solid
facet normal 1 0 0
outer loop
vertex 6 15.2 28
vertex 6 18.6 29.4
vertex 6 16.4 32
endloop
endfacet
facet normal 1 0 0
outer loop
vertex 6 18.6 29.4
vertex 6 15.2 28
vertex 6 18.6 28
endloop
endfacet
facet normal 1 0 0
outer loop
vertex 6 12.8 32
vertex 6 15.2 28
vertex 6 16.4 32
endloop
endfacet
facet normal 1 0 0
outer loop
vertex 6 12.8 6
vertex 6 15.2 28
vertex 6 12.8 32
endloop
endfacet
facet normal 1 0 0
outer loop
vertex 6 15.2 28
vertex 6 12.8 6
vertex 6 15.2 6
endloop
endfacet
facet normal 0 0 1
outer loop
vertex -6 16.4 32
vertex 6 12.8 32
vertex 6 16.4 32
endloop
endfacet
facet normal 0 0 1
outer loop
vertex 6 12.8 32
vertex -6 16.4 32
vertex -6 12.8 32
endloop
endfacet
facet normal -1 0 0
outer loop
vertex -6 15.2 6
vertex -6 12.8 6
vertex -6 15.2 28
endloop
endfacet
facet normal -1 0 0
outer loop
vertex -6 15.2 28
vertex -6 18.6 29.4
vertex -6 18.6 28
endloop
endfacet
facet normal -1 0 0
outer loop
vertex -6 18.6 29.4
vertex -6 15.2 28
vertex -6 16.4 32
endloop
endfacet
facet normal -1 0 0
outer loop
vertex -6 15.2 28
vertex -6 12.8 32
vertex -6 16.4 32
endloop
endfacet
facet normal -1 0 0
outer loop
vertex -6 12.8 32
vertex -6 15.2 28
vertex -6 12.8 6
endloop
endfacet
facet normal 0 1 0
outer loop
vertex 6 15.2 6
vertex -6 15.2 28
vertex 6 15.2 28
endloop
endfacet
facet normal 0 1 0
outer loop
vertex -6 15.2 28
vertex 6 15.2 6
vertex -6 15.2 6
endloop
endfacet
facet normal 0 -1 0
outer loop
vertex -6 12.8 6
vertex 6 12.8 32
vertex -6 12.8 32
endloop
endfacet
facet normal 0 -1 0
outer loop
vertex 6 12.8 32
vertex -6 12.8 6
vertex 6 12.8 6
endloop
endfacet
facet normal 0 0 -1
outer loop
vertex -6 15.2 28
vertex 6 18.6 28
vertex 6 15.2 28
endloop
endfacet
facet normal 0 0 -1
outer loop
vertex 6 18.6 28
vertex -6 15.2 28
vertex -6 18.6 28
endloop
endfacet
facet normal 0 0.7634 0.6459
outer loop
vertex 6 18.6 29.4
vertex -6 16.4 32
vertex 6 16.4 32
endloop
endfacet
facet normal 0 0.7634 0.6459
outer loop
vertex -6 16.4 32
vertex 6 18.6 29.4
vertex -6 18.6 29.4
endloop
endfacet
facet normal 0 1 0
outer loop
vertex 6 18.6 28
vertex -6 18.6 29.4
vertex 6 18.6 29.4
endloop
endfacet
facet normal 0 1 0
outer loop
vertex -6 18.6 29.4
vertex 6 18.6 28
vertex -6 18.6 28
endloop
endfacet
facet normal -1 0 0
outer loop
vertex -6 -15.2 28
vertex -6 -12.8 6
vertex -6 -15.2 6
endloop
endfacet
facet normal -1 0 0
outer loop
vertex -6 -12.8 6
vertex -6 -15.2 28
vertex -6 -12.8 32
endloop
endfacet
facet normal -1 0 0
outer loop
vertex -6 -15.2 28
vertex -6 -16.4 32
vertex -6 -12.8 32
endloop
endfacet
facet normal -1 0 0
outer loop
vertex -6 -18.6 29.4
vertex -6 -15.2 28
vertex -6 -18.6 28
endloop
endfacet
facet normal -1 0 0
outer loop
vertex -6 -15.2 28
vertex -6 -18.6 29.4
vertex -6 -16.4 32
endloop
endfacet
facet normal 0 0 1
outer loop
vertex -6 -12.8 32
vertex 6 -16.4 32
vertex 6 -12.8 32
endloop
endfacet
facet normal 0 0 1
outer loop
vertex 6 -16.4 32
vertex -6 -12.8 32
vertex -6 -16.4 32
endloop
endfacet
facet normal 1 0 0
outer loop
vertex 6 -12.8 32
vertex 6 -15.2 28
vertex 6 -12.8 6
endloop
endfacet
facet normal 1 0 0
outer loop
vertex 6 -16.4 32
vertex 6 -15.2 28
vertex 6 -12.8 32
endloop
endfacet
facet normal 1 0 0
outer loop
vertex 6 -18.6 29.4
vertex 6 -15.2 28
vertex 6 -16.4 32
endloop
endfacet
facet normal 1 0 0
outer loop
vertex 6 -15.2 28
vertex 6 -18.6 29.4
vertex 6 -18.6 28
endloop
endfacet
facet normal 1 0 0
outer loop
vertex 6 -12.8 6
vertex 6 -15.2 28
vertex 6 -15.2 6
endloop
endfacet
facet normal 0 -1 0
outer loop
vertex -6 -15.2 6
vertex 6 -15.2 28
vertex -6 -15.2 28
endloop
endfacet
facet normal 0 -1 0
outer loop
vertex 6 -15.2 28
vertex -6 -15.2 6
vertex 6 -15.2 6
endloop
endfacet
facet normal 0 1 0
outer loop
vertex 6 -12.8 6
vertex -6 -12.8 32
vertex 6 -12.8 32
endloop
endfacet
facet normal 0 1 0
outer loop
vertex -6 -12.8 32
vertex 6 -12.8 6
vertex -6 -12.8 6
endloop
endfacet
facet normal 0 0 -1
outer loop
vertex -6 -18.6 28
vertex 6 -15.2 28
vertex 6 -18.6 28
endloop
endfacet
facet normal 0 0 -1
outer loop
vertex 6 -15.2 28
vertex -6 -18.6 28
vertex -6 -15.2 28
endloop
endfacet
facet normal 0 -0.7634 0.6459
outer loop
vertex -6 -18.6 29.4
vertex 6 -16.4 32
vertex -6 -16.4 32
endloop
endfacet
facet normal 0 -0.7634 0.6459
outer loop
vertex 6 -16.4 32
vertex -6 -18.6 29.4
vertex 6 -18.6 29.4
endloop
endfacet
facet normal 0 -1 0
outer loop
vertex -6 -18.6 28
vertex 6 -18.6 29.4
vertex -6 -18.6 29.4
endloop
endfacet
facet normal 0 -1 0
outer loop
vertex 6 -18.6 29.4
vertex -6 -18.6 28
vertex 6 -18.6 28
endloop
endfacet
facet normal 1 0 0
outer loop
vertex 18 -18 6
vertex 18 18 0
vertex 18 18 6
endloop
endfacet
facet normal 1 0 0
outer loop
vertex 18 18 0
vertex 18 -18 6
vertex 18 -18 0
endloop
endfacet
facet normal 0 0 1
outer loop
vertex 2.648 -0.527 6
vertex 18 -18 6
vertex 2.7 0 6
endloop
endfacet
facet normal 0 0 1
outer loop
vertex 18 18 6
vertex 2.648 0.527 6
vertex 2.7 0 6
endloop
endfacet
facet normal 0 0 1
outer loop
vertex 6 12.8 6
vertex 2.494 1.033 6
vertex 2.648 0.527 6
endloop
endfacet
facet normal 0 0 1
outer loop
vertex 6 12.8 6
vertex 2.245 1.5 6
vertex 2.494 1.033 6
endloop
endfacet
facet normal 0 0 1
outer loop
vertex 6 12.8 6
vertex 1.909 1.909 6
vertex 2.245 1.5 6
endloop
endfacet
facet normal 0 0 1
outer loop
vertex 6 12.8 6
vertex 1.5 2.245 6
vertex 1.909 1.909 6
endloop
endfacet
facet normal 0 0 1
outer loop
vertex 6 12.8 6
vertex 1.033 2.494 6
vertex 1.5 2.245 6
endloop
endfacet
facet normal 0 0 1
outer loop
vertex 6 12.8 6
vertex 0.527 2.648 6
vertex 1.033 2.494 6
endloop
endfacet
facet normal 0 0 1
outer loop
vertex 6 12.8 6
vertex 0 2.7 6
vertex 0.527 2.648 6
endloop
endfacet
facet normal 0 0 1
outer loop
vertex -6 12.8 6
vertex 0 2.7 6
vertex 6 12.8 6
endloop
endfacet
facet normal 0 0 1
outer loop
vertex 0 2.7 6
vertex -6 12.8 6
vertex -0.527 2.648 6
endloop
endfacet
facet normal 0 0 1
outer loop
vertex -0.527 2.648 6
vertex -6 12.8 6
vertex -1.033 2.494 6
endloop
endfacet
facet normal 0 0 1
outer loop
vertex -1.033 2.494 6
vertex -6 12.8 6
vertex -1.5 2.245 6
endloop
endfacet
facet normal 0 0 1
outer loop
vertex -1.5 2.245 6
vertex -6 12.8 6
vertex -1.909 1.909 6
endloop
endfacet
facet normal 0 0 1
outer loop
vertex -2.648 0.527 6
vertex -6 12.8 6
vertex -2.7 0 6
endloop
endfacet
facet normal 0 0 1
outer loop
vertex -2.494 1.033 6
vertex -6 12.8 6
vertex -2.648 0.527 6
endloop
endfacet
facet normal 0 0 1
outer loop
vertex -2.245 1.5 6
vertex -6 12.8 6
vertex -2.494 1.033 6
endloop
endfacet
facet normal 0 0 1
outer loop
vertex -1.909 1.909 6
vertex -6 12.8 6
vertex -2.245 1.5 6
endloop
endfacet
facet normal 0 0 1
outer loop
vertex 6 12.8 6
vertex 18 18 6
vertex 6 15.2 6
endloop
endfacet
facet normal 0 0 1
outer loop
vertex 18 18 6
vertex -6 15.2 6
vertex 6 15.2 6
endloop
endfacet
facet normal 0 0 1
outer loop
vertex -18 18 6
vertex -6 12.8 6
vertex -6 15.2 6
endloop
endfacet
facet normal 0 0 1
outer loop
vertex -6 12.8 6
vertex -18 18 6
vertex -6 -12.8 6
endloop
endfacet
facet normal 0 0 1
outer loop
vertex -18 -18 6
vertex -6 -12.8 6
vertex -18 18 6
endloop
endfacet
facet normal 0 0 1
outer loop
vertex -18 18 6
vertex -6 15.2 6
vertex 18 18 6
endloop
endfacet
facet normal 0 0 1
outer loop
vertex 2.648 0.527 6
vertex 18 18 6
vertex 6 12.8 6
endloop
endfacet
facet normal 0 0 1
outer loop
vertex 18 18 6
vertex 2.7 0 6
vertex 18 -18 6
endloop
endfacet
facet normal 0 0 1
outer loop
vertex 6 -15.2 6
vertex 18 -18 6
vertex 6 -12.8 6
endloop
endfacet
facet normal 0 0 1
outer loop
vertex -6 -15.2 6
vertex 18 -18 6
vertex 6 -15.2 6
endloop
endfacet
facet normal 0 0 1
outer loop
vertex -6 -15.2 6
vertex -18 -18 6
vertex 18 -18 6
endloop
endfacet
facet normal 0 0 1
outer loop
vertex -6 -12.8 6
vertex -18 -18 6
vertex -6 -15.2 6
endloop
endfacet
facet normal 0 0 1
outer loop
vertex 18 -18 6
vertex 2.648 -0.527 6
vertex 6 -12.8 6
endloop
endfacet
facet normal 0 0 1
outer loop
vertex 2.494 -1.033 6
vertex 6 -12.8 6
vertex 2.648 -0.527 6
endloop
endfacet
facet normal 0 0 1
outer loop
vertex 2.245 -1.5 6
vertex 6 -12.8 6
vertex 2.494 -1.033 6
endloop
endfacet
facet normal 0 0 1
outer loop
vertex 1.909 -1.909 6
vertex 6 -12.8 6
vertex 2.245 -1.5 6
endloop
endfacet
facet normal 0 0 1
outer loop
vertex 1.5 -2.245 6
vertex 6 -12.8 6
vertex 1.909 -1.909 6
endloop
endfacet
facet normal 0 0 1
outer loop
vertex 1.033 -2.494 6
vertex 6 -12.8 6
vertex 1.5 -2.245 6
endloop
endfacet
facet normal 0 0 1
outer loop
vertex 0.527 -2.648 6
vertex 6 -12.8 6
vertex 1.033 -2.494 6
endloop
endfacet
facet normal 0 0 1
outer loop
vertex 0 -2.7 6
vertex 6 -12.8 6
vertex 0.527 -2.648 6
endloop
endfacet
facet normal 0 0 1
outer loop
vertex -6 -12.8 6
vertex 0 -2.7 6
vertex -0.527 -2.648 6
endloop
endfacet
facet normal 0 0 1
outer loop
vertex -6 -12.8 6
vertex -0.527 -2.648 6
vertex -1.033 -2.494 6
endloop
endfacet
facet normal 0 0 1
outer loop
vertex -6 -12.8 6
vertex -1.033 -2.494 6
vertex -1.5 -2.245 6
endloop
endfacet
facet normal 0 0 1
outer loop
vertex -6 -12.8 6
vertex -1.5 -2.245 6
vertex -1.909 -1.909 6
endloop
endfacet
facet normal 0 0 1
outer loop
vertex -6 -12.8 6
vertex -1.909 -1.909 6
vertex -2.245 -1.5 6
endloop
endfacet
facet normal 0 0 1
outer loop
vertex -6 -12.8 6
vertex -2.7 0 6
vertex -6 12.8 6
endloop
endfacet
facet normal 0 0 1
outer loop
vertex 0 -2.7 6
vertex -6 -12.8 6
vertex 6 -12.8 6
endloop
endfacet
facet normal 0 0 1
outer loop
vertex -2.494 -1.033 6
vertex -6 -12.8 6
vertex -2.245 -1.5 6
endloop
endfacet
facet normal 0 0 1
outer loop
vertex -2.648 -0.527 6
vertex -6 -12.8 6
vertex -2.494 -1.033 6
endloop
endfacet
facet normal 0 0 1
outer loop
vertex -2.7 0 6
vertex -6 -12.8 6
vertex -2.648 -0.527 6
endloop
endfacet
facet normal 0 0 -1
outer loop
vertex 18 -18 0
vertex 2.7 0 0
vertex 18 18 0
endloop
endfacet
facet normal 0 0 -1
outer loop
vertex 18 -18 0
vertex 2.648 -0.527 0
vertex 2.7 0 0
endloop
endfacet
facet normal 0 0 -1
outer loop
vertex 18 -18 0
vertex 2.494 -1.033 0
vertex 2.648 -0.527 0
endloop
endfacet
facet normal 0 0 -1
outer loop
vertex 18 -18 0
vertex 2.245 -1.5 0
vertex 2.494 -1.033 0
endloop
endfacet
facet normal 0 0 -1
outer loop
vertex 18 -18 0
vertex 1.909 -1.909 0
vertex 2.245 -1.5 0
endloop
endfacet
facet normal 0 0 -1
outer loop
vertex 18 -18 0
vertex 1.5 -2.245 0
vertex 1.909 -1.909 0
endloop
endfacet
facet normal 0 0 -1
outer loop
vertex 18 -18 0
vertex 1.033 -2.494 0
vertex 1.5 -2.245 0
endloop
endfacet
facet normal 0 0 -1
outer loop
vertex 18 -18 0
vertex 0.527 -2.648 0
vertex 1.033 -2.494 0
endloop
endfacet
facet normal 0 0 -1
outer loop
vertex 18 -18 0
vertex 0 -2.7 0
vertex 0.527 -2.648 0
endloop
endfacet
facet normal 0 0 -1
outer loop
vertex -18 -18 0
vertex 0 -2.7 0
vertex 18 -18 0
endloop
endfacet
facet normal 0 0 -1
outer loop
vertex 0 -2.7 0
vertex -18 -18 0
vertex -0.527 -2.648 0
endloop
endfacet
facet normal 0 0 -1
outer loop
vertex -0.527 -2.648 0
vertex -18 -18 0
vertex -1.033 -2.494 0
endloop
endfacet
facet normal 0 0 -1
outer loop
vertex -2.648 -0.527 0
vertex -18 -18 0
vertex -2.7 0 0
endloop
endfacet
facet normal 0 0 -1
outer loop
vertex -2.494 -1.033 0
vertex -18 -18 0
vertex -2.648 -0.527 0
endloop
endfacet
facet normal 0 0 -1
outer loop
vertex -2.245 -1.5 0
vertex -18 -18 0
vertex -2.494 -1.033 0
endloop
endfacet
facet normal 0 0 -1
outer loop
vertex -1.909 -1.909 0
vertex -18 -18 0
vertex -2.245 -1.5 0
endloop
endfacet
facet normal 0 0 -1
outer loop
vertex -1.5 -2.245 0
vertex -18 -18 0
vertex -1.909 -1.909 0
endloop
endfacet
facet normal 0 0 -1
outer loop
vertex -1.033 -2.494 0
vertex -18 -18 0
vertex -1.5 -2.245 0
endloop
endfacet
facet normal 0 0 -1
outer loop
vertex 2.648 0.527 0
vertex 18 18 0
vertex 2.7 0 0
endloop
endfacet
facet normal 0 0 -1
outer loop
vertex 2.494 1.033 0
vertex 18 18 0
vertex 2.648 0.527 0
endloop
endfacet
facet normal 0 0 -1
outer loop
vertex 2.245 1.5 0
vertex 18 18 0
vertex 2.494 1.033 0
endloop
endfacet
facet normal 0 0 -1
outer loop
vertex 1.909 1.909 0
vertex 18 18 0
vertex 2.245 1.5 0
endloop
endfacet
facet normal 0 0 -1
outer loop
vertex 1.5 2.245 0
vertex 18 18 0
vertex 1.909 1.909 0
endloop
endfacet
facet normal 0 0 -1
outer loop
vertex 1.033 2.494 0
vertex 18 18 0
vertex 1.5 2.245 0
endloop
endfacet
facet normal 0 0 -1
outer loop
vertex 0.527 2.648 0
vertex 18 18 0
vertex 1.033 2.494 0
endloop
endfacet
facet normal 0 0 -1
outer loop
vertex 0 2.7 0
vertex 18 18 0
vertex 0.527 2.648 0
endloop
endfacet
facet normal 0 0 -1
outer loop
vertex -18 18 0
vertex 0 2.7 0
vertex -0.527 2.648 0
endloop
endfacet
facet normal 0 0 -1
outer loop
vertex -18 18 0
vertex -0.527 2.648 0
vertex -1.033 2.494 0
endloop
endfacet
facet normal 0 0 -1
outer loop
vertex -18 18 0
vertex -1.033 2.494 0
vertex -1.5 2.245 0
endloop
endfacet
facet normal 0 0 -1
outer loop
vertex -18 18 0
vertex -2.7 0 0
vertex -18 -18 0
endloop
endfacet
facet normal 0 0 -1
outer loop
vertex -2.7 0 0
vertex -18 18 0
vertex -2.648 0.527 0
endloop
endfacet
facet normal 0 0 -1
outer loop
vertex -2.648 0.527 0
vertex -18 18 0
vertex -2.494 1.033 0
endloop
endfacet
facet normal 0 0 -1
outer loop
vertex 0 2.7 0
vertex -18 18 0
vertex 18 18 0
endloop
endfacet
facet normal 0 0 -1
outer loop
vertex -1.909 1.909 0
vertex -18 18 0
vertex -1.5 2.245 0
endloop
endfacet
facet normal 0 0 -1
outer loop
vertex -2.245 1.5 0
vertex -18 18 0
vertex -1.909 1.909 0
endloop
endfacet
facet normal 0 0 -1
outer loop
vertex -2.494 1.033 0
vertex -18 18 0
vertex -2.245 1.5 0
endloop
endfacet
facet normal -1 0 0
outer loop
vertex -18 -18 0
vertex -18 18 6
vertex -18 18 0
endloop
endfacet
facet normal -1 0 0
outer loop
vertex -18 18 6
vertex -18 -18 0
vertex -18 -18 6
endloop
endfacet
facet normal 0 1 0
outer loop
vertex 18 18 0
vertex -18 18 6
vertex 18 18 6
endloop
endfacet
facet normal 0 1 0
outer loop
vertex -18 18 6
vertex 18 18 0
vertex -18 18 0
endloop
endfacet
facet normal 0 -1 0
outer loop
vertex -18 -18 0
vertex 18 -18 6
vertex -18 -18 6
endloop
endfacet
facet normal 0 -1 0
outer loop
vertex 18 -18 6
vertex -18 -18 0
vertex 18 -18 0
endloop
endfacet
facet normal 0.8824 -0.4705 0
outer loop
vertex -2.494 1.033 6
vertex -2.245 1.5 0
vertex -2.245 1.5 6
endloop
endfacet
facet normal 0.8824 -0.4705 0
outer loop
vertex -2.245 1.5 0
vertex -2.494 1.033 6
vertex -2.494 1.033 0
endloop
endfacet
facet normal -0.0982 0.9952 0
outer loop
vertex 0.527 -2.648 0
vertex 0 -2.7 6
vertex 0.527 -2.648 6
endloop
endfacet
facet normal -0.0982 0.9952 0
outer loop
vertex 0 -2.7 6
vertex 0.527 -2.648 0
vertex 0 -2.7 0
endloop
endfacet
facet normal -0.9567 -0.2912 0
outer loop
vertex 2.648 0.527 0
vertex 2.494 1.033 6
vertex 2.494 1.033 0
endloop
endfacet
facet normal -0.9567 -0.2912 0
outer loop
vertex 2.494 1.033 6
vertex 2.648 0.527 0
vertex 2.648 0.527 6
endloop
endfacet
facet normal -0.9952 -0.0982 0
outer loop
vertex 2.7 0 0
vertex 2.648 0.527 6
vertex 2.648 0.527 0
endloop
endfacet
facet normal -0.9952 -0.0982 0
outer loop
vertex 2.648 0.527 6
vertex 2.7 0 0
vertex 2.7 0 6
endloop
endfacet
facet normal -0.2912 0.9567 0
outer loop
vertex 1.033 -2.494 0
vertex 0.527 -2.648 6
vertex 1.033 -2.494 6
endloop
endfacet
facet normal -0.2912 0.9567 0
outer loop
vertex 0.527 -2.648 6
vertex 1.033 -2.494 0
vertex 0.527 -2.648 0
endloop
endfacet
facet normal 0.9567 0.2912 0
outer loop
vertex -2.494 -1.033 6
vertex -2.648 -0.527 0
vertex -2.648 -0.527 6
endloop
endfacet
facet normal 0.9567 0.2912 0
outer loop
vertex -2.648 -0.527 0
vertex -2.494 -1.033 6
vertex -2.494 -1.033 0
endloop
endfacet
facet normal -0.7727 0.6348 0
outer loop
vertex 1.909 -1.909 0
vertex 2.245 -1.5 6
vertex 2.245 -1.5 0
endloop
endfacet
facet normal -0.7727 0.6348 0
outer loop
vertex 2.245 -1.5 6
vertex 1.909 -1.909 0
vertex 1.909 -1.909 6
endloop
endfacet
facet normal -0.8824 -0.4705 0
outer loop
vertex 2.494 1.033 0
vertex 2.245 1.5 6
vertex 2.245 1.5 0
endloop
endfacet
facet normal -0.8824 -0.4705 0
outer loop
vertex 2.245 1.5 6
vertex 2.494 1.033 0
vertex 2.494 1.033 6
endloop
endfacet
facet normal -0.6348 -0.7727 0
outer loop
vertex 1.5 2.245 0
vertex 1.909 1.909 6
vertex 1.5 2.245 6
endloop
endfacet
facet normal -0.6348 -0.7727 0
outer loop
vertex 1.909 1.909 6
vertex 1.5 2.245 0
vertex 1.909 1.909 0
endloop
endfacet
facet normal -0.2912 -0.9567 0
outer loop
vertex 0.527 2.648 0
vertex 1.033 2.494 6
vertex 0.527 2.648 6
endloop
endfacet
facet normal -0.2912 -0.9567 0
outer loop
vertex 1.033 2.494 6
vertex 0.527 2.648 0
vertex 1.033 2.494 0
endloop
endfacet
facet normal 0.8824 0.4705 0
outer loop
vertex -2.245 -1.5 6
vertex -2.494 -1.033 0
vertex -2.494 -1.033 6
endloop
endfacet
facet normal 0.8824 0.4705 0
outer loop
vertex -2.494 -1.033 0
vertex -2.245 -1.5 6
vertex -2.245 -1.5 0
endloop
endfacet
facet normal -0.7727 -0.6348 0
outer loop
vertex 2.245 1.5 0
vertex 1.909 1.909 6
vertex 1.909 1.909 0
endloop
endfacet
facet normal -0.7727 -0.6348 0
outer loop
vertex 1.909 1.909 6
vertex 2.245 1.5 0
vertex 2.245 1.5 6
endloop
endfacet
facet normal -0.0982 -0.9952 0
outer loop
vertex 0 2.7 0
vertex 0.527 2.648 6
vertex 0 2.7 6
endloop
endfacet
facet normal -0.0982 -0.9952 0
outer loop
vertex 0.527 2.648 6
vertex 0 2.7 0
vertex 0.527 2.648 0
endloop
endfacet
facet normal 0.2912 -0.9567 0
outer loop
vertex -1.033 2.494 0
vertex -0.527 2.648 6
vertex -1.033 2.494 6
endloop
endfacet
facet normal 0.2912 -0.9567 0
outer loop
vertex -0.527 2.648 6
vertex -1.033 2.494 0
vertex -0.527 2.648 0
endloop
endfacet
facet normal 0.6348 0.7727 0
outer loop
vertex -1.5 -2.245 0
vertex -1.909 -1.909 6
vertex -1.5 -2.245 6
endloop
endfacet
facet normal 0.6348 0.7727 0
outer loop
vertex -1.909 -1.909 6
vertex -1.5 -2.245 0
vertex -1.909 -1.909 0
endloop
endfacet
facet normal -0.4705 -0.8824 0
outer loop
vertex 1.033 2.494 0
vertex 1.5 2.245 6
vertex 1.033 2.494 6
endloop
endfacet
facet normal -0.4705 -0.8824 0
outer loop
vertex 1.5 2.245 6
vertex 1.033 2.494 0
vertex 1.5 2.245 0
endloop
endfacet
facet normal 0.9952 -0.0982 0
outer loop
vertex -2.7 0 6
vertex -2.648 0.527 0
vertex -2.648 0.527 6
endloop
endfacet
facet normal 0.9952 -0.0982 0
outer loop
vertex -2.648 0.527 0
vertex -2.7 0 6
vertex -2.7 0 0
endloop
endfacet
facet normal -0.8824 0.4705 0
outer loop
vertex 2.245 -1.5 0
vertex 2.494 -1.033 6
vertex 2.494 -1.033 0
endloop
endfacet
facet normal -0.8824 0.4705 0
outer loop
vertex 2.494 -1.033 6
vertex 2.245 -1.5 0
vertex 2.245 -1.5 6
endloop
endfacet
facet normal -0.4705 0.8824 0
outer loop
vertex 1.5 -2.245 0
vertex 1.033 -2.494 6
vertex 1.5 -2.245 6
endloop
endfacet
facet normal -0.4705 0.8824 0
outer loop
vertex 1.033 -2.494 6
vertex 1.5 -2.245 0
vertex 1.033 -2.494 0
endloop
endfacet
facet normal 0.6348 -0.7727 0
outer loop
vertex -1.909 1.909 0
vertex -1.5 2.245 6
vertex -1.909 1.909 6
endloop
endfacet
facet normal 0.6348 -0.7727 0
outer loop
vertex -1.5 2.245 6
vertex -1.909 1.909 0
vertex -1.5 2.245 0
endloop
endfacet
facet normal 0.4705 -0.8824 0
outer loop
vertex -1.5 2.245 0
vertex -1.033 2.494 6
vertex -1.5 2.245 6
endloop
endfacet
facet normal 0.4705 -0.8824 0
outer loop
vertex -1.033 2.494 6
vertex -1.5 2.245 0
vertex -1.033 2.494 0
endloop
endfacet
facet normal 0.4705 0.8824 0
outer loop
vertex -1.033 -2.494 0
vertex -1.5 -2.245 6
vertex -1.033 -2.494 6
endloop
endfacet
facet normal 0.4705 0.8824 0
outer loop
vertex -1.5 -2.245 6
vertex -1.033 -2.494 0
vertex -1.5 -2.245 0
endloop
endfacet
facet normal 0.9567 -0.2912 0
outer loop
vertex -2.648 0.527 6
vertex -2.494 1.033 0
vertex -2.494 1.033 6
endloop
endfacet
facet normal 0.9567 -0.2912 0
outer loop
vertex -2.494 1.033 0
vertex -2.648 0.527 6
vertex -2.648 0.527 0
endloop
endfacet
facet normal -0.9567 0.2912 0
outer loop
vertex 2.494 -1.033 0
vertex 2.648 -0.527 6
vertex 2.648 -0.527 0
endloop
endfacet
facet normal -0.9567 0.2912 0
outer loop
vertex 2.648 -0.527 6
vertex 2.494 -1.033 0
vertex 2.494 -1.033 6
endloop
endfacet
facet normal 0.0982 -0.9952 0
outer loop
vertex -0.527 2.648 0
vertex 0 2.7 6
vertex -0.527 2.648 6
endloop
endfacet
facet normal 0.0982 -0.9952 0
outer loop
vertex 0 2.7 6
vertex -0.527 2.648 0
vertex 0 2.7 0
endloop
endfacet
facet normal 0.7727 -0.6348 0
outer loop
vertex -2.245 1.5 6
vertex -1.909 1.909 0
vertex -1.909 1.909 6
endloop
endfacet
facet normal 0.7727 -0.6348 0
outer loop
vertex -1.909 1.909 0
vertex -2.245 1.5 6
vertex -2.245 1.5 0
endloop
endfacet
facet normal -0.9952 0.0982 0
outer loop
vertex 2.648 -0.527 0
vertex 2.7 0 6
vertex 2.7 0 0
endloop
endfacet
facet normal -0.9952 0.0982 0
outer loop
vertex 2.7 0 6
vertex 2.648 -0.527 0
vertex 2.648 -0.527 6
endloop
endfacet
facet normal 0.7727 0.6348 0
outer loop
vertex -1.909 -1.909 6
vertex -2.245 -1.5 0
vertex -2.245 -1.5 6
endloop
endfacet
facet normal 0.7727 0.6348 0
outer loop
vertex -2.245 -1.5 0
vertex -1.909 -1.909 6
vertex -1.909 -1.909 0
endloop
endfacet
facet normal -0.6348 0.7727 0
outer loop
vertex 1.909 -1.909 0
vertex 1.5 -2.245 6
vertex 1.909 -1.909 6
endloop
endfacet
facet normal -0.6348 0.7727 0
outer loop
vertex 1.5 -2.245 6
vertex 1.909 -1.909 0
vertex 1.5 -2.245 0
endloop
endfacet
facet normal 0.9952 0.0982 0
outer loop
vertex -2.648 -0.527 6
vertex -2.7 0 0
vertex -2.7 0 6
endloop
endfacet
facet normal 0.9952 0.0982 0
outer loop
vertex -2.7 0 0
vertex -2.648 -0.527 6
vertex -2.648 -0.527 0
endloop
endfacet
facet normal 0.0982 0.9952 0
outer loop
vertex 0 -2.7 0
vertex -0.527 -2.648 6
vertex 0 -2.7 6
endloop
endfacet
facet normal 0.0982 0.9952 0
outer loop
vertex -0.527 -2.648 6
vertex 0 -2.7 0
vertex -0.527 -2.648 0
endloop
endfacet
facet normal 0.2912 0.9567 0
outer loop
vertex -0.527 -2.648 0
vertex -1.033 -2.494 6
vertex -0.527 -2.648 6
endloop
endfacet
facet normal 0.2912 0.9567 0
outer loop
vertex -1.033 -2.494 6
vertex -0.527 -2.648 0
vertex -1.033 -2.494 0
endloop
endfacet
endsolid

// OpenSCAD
$fn = 32;

// ----------------------------------------------------------------------
// Snap-fit latch: 2 arms, 26 mm tall, 3.6 mm undercut hooks
// ----------------------------------------------------------------------

// --- parameters (mm) ---
base_d = 36;              // base plate depth
base_h = 6;               // base plate thickness
span = 28;                // distance between opposite arms
arm_t = 2.4;              // arm thickness
arm_d = 12;               // arm width
height = 26;              // free arm length
head_len = 3.6;           // hook reach
head_h = 4;               // hook height
lead = 1.4;               // lead-in ramp thickness
bore_d = 5.4;             // base fixing bore
top_z = 32;               // height of the arm tips above the base

arms = 2;

difference() {
  union() {
    /* base plate, centred on the arm ring */
    translate([-18, -18, 0]) cube([base_d, base_d, base_h]);
    for (a = [0 : 360 / arms : 359]) rotate([0, 0, a]) {
    /* arm, sunk 0.5 mm into the base */
    translate([-arm_d / 2, span / 2 - arm_t / 2, base_h - 0.5]) cube([arm_d, arm_t, height + 0.5]);
    /* hook: a convex hull of a tall inner block and a thin outer lip
       gives a flat undercut below and a lead-in ramp on top */
    hull() {
      translate([-arm_d / 2, span / 2 + arm_t / 2 - 0.6, top_z - head_h]) cube([arm_d, lead + 0.4, head_h]);
      translate([-arm_d / 2, span / 2 + arm_t / 2 - 0.2, top_z - head_h]) cube([arm_d, head_len, lead]);
    }
    }
  }
  translate([0, 0, -2.5]) cylinder(h = base_h + 5, d = bore_d);
}
